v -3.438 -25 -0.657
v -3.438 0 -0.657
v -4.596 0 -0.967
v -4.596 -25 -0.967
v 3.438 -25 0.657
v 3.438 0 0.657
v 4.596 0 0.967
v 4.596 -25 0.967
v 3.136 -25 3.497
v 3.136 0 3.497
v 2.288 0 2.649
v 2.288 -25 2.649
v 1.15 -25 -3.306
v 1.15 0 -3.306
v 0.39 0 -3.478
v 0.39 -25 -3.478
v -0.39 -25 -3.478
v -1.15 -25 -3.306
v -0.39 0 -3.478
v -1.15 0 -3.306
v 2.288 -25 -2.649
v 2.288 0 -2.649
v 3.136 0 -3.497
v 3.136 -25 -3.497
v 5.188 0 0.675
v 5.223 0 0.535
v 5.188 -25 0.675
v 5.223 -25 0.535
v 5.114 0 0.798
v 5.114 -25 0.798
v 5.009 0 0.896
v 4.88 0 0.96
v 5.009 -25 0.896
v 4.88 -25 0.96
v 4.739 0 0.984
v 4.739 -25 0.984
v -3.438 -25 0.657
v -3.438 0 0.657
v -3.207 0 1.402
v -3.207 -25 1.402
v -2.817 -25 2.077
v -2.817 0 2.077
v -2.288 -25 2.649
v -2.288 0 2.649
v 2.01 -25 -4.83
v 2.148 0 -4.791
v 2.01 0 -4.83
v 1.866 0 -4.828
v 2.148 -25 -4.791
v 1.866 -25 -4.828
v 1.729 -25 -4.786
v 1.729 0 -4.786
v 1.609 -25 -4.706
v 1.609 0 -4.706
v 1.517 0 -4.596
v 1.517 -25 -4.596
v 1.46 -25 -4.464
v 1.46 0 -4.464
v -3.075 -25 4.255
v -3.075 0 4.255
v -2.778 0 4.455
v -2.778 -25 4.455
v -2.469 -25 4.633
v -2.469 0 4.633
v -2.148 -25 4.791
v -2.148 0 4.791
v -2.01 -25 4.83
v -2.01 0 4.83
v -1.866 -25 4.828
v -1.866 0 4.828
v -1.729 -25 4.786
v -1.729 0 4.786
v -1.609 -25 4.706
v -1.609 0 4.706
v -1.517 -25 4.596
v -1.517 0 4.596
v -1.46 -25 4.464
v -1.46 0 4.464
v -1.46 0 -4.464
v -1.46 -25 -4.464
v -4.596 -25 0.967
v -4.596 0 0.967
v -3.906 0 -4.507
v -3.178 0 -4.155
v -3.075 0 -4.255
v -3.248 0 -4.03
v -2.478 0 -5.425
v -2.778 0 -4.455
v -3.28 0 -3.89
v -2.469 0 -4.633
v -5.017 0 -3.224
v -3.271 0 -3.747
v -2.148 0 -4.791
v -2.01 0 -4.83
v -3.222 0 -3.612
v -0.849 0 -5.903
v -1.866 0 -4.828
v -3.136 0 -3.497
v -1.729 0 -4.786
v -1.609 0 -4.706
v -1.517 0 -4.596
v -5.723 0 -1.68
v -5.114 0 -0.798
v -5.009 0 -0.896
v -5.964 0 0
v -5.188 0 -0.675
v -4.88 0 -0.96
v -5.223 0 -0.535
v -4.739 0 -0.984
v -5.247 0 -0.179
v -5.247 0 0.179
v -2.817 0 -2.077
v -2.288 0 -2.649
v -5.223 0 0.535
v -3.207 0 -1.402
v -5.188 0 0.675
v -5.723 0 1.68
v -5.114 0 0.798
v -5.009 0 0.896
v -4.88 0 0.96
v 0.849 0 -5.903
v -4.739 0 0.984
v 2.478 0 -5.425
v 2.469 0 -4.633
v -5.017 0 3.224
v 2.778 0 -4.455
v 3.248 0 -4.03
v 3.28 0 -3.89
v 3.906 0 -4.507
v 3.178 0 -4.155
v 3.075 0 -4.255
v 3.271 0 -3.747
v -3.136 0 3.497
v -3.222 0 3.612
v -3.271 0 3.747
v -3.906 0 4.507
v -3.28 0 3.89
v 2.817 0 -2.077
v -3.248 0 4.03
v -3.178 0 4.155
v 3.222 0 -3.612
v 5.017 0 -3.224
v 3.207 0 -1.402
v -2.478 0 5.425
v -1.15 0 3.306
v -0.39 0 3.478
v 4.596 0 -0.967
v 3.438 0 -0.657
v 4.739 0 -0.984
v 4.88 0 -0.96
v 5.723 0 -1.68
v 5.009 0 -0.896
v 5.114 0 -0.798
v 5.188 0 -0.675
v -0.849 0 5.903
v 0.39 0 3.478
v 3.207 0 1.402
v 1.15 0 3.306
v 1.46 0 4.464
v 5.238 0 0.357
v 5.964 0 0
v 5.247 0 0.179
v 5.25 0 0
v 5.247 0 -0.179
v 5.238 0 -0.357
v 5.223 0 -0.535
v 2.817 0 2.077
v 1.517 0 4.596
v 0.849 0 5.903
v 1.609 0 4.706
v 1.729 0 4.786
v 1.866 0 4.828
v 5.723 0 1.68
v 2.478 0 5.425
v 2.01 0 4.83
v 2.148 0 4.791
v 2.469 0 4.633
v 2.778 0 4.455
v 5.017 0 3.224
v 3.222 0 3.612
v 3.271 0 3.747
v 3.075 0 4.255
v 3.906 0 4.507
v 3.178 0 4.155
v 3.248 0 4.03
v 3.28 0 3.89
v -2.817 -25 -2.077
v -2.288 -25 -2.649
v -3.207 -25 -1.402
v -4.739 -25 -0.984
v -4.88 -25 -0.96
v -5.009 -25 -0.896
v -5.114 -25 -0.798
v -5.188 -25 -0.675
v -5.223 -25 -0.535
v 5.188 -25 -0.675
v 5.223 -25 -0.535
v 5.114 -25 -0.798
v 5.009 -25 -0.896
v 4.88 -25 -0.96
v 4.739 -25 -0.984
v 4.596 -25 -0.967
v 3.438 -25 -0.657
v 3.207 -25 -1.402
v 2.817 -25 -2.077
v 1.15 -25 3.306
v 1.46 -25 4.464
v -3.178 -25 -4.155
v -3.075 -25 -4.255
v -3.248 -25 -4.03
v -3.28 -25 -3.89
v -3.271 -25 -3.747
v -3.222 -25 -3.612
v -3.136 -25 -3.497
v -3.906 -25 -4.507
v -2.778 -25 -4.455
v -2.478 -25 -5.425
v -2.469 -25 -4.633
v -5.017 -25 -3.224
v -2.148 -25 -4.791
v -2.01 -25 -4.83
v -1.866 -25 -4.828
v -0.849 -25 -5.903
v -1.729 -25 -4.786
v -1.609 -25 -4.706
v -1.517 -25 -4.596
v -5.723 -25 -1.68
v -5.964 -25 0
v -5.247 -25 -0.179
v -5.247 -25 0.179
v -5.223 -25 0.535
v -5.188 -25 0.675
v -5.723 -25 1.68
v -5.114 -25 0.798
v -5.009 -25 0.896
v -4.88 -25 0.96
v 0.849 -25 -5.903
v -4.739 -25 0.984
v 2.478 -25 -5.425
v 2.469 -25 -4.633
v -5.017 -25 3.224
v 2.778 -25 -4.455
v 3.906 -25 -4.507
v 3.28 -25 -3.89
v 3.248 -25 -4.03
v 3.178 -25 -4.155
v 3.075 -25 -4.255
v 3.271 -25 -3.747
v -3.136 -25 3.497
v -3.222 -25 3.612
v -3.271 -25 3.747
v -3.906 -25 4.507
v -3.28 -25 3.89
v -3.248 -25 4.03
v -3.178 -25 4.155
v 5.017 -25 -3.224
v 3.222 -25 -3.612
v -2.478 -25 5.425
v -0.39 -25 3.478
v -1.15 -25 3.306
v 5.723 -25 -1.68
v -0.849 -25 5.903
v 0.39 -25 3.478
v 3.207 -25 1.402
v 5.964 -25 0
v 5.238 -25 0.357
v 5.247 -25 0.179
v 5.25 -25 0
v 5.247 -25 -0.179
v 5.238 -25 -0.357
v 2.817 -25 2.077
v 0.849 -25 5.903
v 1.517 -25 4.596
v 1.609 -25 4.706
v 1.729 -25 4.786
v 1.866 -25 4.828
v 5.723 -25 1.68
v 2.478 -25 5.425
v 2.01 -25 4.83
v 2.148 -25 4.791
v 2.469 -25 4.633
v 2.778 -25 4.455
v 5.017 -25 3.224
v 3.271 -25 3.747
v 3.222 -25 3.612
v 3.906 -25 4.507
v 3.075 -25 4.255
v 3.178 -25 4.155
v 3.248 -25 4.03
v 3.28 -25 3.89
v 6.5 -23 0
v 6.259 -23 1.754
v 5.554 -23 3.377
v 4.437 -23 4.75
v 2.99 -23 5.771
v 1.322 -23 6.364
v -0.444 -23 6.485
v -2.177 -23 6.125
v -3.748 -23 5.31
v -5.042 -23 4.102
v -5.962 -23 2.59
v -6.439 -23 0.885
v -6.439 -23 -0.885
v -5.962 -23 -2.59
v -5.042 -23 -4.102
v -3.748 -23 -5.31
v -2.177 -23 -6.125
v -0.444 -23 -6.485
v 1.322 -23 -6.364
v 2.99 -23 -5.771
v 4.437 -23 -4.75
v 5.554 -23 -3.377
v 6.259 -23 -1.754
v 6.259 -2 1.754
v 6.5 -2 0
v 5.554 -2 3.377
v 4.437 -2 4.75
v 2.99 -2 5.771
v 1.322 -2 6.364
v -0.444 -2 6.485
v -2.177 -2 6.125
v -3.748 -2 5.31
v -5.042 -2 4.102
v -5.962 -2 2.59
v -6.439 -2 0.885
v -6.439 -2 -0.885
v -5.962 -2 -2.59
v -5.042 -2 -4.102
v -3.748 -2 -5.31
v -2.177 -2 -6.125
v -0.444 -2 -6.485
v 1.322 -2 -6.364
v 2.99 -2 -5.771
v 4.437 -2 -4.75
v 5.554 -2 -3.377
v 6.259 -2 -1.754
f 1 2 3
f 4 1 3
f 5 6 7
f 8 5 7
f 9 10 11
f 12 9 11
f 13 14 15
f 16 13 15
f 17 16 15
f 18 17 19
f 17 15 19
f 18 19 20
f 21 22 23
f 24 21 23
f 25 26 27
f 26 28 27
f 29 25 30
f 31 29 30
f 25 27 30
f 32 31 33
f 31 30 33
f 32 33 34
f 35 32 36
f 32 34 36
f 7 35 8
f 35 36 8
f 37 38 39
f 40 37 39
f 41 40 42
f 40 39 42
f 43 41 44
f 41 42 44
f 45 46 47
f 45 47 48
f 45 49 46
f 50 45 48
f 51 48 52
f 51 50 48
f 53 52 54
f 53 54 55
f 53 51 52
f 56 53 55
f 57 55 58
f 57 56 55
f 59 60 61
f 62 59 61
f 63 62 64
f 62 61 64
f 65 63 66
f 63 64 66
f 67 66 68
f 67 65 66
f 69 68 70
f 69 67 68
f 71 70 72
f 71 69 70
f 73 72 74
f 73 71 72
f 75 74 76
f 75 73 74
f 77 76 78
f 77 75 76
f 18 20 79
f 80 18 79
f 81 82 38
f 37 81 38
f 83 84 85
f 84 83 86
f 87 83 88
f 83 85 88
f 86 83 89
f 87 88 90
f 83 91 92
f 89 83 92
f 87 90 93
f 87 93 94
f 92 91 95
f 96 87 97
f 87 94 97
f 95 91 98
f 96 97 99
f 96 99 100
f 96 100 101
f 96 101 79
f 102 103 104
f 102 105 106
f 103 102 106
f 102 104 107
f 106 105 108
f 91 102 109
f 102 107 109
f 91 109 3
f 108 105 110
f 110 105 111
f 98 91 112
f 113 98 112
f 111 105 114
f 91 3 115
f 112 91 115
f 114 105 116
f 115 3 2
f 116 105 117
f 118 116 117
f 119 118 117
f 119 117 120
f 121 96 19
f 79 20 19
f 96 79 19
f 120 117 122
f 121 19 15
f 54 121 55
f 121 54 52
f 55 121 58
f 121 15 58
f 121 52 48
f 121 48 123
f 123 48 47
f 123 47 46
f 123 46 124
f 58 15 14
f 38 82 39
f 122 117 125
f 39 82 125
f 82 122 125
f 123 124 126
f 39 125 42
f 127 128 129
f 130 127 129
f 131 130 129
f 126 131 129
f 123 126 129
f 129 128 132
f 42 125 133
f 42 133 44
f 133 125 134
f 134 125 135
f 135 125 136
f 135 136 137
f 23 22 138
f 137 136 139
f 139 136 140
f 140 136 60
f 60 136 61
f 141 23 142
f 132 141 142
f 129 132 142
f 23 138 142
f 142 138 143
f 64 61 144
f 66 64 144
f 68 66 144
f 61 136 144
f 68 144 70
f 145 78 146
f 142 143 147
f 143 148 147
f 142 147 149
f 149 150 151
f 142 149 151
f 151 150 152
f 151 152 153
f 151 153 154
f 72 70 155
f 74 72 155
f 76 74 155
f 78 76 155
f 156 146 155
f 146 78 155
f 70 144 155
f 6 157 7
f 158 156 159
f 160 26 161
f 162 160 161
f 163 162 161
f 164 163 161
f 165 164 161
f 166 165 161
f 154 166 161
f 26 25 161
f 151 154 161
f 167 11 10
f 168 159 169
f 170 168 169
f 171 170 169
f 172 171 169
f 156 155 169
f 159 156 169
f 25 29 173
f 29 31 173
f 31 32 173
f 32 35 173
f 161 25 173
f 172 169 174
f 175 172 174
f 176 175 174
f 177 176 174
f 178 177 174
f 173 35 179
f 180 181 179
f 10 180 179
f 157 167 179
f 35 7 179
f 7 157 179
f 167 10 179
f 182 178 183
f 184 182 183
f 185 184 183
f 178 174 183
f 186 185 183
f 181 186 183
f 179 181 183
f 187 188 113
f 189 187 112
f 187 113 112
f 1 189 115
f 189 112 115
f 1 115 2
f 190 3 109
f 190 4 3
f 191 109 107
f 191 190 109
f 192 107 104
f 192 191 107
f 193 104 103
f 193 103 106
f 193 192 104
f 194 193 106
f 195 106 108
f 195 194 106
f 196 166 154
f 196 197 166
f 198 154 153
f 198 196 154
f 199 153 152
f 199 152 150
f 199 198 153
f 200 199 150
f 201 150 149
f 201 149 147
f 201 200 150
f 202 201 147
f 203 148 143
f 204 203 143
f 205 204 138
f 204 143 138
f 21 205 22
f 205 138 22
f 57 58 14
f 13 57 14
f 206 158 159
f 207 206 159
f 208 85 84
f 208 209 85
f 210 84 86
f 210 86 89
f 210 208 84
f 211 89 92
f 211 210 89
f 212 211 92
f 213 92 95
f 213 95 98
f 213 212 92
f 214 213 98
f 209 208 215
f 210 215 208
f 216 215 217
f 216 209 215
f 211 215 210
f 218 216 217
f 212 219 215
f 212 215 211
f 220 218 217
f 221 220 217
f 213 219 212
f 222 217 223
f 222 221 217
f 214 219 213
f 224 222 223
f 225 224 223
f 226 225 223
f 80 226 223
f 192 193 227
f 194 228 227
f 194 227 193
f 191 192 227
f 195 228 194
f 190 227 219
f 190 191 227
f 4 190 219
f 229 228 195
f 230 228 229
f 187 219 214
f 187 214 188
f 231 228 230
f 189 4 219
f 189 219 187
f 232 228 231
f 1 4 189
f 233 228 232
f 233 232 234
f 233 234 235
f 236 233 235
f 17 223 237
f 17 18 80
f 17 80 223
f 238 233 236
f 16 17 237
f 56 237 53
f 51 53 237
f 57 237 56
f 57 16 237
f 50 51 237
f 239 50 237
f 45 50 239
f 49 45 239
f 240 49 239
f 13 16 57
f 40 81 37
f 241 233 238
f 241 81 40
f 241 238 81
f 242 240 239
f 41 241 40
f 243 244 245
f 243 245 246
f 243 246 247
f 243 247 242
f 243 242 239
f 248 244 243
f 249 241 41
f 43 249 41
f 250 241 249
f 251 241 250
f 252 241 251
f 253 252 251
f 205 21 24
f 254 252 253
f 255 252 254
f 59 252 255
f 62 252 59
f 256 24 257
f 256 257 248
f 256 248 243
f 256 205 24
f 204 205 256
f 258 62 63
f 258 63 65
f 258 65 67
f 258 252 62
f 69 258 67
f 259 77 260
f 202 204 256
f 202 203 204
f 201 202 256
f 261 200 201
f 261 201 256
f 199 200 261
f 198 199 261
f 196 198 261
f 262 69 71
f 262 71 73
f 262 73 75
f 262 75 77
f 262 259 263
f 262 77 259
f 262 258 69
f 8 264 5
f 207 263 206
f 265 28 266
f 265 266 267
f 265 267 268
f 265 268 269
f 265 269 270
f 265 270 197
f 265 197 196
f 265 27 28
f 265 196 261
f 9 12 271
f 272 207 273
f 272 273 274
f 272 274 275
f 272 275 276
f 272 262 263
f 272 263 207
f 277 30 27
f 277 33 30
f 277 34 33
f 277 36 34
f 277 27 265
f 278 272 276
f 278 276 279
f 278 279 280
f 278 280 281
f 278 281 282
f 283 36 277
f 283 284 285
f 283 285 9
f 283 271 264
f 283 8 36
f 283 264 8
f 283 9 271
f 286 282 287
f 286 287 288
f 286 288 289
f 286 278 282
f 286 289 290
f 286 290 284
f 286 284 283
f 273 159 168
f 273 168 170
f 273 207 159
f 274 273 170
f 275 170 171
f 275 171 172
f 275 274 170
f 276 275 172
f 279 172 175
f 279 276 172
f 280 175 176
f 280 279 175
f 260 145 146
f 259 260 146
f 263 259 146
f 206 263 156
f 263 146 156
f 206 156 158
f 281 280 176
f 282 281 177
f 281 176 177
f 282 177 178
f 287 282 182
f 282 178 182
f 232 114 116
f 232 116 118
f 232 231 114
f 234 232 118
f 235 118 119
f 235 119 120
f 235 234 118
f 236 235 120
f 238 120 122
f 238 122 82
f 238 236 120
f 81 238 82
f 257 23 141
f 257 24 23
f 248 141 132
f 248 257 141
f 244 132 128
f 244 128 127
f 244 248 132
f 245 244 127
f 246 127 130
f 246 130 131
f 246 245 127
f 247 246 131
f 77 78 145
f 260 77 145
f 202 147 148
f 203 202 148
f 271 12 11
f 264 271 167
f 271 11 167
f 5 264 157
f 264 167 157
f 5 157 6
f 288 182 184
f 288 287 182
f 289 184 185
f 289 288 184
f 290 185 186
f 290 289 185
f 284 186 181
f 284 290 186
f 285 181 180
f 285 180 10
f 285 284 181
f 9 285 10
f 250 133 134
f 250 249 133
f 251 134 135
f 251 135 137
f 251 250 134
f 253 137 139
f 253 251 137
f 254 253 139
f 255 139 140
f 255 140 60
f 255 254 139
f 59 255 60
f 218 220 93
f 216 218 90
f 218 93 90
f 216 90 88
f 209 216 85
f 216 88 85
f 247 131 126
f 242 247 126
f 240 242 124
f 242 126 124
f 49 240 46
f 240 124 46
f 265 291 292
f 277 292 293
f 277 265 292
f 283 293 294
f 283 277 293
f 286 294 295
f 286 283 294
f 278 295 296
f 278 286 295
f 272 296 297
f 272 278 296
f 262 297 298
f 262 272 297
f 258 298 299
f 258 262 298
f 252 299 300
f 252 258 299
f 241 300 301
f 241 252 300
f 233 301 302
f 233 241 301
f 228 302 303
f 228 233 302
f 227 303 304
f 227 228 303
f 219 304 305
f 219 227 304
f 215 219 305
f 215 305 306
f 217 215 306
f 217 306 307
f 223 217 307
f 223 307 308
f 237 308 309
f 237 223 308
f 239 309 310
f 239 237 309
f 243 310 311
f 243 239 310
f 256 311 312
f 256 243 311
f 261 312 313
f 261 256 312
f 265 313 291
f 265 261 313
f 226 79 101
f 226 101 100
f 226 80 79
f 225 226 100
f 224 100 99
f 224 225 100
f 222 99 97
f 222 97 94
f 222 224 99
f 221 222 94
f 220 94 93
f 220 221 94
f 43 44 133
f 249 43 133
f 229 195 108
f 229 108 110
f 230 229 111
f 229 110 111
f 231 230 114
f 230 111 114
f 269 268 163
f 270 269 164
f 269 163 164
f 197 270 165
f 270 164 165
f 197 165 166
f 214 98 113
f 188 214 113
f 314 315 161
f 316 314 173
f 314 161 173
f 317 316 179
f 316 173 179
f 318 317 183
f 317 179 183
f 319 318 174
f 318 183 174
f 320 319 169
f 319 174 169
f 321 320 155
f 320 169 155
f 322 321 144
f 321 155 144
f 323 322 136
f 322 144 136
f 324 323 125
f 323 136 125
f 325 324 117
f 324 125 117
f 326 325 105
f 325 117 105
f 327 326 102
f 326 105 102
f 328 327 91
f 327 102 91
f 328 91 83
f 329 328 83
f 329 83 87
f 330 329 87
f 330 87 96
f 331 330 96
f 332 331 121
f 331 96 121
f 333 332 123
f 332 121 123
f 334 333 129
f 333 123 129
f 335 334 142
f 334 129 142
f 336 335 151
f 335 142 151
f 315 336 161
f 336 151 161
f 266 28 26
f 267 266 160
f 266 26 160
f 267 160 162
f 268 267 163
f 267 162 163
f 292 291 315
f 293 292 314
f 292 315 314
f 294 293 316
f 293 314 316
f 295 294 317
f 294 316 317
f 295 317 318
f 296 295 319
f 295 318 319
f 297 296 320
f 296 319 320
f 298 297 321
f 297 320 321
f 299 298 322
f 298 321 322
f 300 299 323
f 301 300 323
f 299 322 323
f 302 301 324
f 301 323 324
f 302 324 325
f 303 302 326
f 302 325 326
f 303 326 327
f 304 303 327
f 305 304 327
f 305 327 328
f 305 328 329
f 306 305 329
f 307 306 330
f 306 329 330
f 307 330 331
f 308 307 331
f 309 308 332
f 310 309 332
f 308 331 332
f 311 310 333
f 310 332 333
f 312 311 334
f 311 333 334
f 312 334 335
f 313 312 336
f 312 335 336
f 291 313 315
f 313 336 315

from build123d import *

# Parameters (mm, degrees)
F0_R     = 6.5
F1_DEPTH = 25
F2_R     = 0.5
F3_SIZE2 = 0.5358983849
F3_SIZE  = 2


with BuildPart() as f1:
    # F0 (on Front) → F1 (new body)
    with BuildSketch(Plane.XZ):
        Circle(F0_R)
        with BuildLine():
            ThreePointArc((5.1311754503, 1.1106477833), (5.2202093403, 0.5584930108), (5.25, 0))
            ThreePointArc((5.25, 0), (5.2202093403, -0.5584930108), (5.1311754503, -1.1106477833))
            ThreePointArc((5.1311754503, -1.1106477833), (4.5466333699, -2.625), (3.5274369202, -3.8884043995))
            ThreePointArc((3.5274369202, -3.8884043995), (2.625, -4.5466333699), (1.6037385301, -4.9990521829))
            ThreePointArc((1.6037385301, -4.9990521829), (0, -5.25), (-1.6037385301, -4.9990521829))
            ThreePointArc((-1.6037385301, -4.9990521829), (-2.625, -4.5466333699), (-3.5274369202, -3.8884043995))
            ThreePointArc((-3.5274369202, -3.8884043995), (-4.5466333699, -2.625), (-5.1311754503, -1.1106477833))
            ThreePointArc((-5.1311754503, -1.1106477833), (-5.25, 0), (-5.1311754503, 1.1106477833))
            ThreePointArc((-5.1311754503, 1.1106477833), (-4.5466333699, 2.625), (-3.5274369202, 3.8884043995))
            ThreePointArc((-3.5274369202, 3.8884043995), (-2.625, 4.5466333699), (-1.6037385301, 4.9990521829))
            ThreePointArc((-1.6037385301, 4.9990521829), (0, 5.25), (1.6037385301, 4.9990521829))
            ThreePointArc((1.6037385301, 4.9990521829), (2.625, 4.5466333699), (3.5274369202, 3.8884043995))
            ThreePointArc((3.5274369202, 3.8884043995), (4.5466333699, 2.625), (5.1311754503, 1.1106477833))
        make_face(mode=Mode.SUBTRACT)
        with BuildLine():
            Line((1.15, 3.3056769352), (1.6037385301, 4.9990521829))
            ThreePointArc((1.6037385301, 4.9990521829), (0, 5.25), (-1.6037385301, 4.9990521829))
            Line((-1.6037385301, 4.9990521829), (-1.15, 3.3056769352))
            ThreePointArc((-1.15, 3.3056769352), (0, 3.5), (1.15, 3.3056769352))
        make_face()
        with BuildLine():
            Line((3.4378002026, 0.6569092533), (5.1311754503, 1.1106477833))
            ThreePointArc((5.1311754503, 1.1106477833), (4.5466333699, 2.625), (3.5274369202, 3.8884043995))
            Line((3.5274369202, 3.8884043995), (2.2878002026, 2.648767682))
            ThreePointArc((2.2878002026, 2.648767682), (3.0310889132, 1.75), (3.4378002026, 0.6569092533))
        make_face()
        with BuildLine():
            ThreePointArc((3.5274369202, -3.8884043995), (4.5466333699, -2.625), (5.1311754503, -1.1106477833))
            Line((5.1311754503, -1.1106477833), (3.4378002026, -0.6569092533))
            ThreePointArc((3.4378002026, -0.6569092533), (3.0310889132, -1.75), (2.2878002026, -2.648767682))
            Line((2.2878002026, -2.648767682), (3.5274369202, -3.8884043995))
        make_face()
        with BuildLine():
            ThreePointArc((-1.6037385301, -4.9990521829), (0, -5.25), (1.6037385301, -4.9990521829))
            Line((1.6037385301, -4.9990521829), (1.15, -3.3056769352))
            ThreePointArc((1.15, -3.3056769352), (0, -3.5), (-1.15, -3.3056769352))
            Line((-1.15, -3.3056769352), (-1.6037385301, -4.9990521829))
        make_face()
        with BuildLine():
            ThreePointArc((-5.1311754503, -1.1106477833), (-4.5466333699, -2.625), (-3.5274369202, -3.8884043995))
            Line((-3.5274369202, -3.8884043995), (-2.2878002026, -2.648767682))
            ThreePointArc((-2.2878002026, -2.648767682), (-3.0310889132, -1.75), (-3.4378002026, -0.6569092533))
            Line((-3.4378002026, -0.6569092533), (-5.1311754503, -1.1106477833))
        make_face()
        with BuildLine():
            Line((-2.2878002026, 2.648767682), (-3.5274369202, 3.8884043995))
            ThreePointArc((-3.5274369202, 3.8884043995), (-4.5466333699, 2.625), (-5.1311754503, 1.1106477833))
            Line((-5.1311754503, 1.1106477833), (-3.4378002026, 0.6569092533))
            ThreePointArc((-3.4378002026, 0.6569092533), (-3.0310889132, 1.75), (-2.2878002026, 2.648767682))
        make_face()
    extrude(amount=F1_DEPTH)

    # F2
    f2_edges = [f1.edges().sort_by_distance(p)[0] for p in [
        (-3.527437, -12.5, 3.888404),
        (-1.603739, -12.5, 4.999052),
        (1.603739, -12.5, 4.999052),
        (3.527437, -12.5, 3.888404),
        (5.131175, -12.5, 1.110648),
        (5.131175, -12.5, -1.110648),
        (3.527437, -12.5, -3.888404),
        (1.603739, -12.5, -4.999052),
        (-1.603739, -12.5, -4.999052),
        (-3.527437, -12.5, -3.888404),
        (-5.131175, -12.5, -1.110648),
        (-5.131175, -12.5, 1.110648),
    ]]
    fillet(f2_edges, radius=F2_R)

    # F3
    f3_edges = [f1.edges().sort_by_distance(p)[0] for p in [
        (6.5, -12.5, 0),
        (-6.5, 0, 0),
        (-6.5, -25, 0),
    ]]
    f3_side = f1.faces().sort_by_distance((-6.5, -12.5, 0))[0]
    chamfer(f3_edges, length=F3_SIZE, length2=F3_SIZE2, reference=f3_side)


solid = f1.part
